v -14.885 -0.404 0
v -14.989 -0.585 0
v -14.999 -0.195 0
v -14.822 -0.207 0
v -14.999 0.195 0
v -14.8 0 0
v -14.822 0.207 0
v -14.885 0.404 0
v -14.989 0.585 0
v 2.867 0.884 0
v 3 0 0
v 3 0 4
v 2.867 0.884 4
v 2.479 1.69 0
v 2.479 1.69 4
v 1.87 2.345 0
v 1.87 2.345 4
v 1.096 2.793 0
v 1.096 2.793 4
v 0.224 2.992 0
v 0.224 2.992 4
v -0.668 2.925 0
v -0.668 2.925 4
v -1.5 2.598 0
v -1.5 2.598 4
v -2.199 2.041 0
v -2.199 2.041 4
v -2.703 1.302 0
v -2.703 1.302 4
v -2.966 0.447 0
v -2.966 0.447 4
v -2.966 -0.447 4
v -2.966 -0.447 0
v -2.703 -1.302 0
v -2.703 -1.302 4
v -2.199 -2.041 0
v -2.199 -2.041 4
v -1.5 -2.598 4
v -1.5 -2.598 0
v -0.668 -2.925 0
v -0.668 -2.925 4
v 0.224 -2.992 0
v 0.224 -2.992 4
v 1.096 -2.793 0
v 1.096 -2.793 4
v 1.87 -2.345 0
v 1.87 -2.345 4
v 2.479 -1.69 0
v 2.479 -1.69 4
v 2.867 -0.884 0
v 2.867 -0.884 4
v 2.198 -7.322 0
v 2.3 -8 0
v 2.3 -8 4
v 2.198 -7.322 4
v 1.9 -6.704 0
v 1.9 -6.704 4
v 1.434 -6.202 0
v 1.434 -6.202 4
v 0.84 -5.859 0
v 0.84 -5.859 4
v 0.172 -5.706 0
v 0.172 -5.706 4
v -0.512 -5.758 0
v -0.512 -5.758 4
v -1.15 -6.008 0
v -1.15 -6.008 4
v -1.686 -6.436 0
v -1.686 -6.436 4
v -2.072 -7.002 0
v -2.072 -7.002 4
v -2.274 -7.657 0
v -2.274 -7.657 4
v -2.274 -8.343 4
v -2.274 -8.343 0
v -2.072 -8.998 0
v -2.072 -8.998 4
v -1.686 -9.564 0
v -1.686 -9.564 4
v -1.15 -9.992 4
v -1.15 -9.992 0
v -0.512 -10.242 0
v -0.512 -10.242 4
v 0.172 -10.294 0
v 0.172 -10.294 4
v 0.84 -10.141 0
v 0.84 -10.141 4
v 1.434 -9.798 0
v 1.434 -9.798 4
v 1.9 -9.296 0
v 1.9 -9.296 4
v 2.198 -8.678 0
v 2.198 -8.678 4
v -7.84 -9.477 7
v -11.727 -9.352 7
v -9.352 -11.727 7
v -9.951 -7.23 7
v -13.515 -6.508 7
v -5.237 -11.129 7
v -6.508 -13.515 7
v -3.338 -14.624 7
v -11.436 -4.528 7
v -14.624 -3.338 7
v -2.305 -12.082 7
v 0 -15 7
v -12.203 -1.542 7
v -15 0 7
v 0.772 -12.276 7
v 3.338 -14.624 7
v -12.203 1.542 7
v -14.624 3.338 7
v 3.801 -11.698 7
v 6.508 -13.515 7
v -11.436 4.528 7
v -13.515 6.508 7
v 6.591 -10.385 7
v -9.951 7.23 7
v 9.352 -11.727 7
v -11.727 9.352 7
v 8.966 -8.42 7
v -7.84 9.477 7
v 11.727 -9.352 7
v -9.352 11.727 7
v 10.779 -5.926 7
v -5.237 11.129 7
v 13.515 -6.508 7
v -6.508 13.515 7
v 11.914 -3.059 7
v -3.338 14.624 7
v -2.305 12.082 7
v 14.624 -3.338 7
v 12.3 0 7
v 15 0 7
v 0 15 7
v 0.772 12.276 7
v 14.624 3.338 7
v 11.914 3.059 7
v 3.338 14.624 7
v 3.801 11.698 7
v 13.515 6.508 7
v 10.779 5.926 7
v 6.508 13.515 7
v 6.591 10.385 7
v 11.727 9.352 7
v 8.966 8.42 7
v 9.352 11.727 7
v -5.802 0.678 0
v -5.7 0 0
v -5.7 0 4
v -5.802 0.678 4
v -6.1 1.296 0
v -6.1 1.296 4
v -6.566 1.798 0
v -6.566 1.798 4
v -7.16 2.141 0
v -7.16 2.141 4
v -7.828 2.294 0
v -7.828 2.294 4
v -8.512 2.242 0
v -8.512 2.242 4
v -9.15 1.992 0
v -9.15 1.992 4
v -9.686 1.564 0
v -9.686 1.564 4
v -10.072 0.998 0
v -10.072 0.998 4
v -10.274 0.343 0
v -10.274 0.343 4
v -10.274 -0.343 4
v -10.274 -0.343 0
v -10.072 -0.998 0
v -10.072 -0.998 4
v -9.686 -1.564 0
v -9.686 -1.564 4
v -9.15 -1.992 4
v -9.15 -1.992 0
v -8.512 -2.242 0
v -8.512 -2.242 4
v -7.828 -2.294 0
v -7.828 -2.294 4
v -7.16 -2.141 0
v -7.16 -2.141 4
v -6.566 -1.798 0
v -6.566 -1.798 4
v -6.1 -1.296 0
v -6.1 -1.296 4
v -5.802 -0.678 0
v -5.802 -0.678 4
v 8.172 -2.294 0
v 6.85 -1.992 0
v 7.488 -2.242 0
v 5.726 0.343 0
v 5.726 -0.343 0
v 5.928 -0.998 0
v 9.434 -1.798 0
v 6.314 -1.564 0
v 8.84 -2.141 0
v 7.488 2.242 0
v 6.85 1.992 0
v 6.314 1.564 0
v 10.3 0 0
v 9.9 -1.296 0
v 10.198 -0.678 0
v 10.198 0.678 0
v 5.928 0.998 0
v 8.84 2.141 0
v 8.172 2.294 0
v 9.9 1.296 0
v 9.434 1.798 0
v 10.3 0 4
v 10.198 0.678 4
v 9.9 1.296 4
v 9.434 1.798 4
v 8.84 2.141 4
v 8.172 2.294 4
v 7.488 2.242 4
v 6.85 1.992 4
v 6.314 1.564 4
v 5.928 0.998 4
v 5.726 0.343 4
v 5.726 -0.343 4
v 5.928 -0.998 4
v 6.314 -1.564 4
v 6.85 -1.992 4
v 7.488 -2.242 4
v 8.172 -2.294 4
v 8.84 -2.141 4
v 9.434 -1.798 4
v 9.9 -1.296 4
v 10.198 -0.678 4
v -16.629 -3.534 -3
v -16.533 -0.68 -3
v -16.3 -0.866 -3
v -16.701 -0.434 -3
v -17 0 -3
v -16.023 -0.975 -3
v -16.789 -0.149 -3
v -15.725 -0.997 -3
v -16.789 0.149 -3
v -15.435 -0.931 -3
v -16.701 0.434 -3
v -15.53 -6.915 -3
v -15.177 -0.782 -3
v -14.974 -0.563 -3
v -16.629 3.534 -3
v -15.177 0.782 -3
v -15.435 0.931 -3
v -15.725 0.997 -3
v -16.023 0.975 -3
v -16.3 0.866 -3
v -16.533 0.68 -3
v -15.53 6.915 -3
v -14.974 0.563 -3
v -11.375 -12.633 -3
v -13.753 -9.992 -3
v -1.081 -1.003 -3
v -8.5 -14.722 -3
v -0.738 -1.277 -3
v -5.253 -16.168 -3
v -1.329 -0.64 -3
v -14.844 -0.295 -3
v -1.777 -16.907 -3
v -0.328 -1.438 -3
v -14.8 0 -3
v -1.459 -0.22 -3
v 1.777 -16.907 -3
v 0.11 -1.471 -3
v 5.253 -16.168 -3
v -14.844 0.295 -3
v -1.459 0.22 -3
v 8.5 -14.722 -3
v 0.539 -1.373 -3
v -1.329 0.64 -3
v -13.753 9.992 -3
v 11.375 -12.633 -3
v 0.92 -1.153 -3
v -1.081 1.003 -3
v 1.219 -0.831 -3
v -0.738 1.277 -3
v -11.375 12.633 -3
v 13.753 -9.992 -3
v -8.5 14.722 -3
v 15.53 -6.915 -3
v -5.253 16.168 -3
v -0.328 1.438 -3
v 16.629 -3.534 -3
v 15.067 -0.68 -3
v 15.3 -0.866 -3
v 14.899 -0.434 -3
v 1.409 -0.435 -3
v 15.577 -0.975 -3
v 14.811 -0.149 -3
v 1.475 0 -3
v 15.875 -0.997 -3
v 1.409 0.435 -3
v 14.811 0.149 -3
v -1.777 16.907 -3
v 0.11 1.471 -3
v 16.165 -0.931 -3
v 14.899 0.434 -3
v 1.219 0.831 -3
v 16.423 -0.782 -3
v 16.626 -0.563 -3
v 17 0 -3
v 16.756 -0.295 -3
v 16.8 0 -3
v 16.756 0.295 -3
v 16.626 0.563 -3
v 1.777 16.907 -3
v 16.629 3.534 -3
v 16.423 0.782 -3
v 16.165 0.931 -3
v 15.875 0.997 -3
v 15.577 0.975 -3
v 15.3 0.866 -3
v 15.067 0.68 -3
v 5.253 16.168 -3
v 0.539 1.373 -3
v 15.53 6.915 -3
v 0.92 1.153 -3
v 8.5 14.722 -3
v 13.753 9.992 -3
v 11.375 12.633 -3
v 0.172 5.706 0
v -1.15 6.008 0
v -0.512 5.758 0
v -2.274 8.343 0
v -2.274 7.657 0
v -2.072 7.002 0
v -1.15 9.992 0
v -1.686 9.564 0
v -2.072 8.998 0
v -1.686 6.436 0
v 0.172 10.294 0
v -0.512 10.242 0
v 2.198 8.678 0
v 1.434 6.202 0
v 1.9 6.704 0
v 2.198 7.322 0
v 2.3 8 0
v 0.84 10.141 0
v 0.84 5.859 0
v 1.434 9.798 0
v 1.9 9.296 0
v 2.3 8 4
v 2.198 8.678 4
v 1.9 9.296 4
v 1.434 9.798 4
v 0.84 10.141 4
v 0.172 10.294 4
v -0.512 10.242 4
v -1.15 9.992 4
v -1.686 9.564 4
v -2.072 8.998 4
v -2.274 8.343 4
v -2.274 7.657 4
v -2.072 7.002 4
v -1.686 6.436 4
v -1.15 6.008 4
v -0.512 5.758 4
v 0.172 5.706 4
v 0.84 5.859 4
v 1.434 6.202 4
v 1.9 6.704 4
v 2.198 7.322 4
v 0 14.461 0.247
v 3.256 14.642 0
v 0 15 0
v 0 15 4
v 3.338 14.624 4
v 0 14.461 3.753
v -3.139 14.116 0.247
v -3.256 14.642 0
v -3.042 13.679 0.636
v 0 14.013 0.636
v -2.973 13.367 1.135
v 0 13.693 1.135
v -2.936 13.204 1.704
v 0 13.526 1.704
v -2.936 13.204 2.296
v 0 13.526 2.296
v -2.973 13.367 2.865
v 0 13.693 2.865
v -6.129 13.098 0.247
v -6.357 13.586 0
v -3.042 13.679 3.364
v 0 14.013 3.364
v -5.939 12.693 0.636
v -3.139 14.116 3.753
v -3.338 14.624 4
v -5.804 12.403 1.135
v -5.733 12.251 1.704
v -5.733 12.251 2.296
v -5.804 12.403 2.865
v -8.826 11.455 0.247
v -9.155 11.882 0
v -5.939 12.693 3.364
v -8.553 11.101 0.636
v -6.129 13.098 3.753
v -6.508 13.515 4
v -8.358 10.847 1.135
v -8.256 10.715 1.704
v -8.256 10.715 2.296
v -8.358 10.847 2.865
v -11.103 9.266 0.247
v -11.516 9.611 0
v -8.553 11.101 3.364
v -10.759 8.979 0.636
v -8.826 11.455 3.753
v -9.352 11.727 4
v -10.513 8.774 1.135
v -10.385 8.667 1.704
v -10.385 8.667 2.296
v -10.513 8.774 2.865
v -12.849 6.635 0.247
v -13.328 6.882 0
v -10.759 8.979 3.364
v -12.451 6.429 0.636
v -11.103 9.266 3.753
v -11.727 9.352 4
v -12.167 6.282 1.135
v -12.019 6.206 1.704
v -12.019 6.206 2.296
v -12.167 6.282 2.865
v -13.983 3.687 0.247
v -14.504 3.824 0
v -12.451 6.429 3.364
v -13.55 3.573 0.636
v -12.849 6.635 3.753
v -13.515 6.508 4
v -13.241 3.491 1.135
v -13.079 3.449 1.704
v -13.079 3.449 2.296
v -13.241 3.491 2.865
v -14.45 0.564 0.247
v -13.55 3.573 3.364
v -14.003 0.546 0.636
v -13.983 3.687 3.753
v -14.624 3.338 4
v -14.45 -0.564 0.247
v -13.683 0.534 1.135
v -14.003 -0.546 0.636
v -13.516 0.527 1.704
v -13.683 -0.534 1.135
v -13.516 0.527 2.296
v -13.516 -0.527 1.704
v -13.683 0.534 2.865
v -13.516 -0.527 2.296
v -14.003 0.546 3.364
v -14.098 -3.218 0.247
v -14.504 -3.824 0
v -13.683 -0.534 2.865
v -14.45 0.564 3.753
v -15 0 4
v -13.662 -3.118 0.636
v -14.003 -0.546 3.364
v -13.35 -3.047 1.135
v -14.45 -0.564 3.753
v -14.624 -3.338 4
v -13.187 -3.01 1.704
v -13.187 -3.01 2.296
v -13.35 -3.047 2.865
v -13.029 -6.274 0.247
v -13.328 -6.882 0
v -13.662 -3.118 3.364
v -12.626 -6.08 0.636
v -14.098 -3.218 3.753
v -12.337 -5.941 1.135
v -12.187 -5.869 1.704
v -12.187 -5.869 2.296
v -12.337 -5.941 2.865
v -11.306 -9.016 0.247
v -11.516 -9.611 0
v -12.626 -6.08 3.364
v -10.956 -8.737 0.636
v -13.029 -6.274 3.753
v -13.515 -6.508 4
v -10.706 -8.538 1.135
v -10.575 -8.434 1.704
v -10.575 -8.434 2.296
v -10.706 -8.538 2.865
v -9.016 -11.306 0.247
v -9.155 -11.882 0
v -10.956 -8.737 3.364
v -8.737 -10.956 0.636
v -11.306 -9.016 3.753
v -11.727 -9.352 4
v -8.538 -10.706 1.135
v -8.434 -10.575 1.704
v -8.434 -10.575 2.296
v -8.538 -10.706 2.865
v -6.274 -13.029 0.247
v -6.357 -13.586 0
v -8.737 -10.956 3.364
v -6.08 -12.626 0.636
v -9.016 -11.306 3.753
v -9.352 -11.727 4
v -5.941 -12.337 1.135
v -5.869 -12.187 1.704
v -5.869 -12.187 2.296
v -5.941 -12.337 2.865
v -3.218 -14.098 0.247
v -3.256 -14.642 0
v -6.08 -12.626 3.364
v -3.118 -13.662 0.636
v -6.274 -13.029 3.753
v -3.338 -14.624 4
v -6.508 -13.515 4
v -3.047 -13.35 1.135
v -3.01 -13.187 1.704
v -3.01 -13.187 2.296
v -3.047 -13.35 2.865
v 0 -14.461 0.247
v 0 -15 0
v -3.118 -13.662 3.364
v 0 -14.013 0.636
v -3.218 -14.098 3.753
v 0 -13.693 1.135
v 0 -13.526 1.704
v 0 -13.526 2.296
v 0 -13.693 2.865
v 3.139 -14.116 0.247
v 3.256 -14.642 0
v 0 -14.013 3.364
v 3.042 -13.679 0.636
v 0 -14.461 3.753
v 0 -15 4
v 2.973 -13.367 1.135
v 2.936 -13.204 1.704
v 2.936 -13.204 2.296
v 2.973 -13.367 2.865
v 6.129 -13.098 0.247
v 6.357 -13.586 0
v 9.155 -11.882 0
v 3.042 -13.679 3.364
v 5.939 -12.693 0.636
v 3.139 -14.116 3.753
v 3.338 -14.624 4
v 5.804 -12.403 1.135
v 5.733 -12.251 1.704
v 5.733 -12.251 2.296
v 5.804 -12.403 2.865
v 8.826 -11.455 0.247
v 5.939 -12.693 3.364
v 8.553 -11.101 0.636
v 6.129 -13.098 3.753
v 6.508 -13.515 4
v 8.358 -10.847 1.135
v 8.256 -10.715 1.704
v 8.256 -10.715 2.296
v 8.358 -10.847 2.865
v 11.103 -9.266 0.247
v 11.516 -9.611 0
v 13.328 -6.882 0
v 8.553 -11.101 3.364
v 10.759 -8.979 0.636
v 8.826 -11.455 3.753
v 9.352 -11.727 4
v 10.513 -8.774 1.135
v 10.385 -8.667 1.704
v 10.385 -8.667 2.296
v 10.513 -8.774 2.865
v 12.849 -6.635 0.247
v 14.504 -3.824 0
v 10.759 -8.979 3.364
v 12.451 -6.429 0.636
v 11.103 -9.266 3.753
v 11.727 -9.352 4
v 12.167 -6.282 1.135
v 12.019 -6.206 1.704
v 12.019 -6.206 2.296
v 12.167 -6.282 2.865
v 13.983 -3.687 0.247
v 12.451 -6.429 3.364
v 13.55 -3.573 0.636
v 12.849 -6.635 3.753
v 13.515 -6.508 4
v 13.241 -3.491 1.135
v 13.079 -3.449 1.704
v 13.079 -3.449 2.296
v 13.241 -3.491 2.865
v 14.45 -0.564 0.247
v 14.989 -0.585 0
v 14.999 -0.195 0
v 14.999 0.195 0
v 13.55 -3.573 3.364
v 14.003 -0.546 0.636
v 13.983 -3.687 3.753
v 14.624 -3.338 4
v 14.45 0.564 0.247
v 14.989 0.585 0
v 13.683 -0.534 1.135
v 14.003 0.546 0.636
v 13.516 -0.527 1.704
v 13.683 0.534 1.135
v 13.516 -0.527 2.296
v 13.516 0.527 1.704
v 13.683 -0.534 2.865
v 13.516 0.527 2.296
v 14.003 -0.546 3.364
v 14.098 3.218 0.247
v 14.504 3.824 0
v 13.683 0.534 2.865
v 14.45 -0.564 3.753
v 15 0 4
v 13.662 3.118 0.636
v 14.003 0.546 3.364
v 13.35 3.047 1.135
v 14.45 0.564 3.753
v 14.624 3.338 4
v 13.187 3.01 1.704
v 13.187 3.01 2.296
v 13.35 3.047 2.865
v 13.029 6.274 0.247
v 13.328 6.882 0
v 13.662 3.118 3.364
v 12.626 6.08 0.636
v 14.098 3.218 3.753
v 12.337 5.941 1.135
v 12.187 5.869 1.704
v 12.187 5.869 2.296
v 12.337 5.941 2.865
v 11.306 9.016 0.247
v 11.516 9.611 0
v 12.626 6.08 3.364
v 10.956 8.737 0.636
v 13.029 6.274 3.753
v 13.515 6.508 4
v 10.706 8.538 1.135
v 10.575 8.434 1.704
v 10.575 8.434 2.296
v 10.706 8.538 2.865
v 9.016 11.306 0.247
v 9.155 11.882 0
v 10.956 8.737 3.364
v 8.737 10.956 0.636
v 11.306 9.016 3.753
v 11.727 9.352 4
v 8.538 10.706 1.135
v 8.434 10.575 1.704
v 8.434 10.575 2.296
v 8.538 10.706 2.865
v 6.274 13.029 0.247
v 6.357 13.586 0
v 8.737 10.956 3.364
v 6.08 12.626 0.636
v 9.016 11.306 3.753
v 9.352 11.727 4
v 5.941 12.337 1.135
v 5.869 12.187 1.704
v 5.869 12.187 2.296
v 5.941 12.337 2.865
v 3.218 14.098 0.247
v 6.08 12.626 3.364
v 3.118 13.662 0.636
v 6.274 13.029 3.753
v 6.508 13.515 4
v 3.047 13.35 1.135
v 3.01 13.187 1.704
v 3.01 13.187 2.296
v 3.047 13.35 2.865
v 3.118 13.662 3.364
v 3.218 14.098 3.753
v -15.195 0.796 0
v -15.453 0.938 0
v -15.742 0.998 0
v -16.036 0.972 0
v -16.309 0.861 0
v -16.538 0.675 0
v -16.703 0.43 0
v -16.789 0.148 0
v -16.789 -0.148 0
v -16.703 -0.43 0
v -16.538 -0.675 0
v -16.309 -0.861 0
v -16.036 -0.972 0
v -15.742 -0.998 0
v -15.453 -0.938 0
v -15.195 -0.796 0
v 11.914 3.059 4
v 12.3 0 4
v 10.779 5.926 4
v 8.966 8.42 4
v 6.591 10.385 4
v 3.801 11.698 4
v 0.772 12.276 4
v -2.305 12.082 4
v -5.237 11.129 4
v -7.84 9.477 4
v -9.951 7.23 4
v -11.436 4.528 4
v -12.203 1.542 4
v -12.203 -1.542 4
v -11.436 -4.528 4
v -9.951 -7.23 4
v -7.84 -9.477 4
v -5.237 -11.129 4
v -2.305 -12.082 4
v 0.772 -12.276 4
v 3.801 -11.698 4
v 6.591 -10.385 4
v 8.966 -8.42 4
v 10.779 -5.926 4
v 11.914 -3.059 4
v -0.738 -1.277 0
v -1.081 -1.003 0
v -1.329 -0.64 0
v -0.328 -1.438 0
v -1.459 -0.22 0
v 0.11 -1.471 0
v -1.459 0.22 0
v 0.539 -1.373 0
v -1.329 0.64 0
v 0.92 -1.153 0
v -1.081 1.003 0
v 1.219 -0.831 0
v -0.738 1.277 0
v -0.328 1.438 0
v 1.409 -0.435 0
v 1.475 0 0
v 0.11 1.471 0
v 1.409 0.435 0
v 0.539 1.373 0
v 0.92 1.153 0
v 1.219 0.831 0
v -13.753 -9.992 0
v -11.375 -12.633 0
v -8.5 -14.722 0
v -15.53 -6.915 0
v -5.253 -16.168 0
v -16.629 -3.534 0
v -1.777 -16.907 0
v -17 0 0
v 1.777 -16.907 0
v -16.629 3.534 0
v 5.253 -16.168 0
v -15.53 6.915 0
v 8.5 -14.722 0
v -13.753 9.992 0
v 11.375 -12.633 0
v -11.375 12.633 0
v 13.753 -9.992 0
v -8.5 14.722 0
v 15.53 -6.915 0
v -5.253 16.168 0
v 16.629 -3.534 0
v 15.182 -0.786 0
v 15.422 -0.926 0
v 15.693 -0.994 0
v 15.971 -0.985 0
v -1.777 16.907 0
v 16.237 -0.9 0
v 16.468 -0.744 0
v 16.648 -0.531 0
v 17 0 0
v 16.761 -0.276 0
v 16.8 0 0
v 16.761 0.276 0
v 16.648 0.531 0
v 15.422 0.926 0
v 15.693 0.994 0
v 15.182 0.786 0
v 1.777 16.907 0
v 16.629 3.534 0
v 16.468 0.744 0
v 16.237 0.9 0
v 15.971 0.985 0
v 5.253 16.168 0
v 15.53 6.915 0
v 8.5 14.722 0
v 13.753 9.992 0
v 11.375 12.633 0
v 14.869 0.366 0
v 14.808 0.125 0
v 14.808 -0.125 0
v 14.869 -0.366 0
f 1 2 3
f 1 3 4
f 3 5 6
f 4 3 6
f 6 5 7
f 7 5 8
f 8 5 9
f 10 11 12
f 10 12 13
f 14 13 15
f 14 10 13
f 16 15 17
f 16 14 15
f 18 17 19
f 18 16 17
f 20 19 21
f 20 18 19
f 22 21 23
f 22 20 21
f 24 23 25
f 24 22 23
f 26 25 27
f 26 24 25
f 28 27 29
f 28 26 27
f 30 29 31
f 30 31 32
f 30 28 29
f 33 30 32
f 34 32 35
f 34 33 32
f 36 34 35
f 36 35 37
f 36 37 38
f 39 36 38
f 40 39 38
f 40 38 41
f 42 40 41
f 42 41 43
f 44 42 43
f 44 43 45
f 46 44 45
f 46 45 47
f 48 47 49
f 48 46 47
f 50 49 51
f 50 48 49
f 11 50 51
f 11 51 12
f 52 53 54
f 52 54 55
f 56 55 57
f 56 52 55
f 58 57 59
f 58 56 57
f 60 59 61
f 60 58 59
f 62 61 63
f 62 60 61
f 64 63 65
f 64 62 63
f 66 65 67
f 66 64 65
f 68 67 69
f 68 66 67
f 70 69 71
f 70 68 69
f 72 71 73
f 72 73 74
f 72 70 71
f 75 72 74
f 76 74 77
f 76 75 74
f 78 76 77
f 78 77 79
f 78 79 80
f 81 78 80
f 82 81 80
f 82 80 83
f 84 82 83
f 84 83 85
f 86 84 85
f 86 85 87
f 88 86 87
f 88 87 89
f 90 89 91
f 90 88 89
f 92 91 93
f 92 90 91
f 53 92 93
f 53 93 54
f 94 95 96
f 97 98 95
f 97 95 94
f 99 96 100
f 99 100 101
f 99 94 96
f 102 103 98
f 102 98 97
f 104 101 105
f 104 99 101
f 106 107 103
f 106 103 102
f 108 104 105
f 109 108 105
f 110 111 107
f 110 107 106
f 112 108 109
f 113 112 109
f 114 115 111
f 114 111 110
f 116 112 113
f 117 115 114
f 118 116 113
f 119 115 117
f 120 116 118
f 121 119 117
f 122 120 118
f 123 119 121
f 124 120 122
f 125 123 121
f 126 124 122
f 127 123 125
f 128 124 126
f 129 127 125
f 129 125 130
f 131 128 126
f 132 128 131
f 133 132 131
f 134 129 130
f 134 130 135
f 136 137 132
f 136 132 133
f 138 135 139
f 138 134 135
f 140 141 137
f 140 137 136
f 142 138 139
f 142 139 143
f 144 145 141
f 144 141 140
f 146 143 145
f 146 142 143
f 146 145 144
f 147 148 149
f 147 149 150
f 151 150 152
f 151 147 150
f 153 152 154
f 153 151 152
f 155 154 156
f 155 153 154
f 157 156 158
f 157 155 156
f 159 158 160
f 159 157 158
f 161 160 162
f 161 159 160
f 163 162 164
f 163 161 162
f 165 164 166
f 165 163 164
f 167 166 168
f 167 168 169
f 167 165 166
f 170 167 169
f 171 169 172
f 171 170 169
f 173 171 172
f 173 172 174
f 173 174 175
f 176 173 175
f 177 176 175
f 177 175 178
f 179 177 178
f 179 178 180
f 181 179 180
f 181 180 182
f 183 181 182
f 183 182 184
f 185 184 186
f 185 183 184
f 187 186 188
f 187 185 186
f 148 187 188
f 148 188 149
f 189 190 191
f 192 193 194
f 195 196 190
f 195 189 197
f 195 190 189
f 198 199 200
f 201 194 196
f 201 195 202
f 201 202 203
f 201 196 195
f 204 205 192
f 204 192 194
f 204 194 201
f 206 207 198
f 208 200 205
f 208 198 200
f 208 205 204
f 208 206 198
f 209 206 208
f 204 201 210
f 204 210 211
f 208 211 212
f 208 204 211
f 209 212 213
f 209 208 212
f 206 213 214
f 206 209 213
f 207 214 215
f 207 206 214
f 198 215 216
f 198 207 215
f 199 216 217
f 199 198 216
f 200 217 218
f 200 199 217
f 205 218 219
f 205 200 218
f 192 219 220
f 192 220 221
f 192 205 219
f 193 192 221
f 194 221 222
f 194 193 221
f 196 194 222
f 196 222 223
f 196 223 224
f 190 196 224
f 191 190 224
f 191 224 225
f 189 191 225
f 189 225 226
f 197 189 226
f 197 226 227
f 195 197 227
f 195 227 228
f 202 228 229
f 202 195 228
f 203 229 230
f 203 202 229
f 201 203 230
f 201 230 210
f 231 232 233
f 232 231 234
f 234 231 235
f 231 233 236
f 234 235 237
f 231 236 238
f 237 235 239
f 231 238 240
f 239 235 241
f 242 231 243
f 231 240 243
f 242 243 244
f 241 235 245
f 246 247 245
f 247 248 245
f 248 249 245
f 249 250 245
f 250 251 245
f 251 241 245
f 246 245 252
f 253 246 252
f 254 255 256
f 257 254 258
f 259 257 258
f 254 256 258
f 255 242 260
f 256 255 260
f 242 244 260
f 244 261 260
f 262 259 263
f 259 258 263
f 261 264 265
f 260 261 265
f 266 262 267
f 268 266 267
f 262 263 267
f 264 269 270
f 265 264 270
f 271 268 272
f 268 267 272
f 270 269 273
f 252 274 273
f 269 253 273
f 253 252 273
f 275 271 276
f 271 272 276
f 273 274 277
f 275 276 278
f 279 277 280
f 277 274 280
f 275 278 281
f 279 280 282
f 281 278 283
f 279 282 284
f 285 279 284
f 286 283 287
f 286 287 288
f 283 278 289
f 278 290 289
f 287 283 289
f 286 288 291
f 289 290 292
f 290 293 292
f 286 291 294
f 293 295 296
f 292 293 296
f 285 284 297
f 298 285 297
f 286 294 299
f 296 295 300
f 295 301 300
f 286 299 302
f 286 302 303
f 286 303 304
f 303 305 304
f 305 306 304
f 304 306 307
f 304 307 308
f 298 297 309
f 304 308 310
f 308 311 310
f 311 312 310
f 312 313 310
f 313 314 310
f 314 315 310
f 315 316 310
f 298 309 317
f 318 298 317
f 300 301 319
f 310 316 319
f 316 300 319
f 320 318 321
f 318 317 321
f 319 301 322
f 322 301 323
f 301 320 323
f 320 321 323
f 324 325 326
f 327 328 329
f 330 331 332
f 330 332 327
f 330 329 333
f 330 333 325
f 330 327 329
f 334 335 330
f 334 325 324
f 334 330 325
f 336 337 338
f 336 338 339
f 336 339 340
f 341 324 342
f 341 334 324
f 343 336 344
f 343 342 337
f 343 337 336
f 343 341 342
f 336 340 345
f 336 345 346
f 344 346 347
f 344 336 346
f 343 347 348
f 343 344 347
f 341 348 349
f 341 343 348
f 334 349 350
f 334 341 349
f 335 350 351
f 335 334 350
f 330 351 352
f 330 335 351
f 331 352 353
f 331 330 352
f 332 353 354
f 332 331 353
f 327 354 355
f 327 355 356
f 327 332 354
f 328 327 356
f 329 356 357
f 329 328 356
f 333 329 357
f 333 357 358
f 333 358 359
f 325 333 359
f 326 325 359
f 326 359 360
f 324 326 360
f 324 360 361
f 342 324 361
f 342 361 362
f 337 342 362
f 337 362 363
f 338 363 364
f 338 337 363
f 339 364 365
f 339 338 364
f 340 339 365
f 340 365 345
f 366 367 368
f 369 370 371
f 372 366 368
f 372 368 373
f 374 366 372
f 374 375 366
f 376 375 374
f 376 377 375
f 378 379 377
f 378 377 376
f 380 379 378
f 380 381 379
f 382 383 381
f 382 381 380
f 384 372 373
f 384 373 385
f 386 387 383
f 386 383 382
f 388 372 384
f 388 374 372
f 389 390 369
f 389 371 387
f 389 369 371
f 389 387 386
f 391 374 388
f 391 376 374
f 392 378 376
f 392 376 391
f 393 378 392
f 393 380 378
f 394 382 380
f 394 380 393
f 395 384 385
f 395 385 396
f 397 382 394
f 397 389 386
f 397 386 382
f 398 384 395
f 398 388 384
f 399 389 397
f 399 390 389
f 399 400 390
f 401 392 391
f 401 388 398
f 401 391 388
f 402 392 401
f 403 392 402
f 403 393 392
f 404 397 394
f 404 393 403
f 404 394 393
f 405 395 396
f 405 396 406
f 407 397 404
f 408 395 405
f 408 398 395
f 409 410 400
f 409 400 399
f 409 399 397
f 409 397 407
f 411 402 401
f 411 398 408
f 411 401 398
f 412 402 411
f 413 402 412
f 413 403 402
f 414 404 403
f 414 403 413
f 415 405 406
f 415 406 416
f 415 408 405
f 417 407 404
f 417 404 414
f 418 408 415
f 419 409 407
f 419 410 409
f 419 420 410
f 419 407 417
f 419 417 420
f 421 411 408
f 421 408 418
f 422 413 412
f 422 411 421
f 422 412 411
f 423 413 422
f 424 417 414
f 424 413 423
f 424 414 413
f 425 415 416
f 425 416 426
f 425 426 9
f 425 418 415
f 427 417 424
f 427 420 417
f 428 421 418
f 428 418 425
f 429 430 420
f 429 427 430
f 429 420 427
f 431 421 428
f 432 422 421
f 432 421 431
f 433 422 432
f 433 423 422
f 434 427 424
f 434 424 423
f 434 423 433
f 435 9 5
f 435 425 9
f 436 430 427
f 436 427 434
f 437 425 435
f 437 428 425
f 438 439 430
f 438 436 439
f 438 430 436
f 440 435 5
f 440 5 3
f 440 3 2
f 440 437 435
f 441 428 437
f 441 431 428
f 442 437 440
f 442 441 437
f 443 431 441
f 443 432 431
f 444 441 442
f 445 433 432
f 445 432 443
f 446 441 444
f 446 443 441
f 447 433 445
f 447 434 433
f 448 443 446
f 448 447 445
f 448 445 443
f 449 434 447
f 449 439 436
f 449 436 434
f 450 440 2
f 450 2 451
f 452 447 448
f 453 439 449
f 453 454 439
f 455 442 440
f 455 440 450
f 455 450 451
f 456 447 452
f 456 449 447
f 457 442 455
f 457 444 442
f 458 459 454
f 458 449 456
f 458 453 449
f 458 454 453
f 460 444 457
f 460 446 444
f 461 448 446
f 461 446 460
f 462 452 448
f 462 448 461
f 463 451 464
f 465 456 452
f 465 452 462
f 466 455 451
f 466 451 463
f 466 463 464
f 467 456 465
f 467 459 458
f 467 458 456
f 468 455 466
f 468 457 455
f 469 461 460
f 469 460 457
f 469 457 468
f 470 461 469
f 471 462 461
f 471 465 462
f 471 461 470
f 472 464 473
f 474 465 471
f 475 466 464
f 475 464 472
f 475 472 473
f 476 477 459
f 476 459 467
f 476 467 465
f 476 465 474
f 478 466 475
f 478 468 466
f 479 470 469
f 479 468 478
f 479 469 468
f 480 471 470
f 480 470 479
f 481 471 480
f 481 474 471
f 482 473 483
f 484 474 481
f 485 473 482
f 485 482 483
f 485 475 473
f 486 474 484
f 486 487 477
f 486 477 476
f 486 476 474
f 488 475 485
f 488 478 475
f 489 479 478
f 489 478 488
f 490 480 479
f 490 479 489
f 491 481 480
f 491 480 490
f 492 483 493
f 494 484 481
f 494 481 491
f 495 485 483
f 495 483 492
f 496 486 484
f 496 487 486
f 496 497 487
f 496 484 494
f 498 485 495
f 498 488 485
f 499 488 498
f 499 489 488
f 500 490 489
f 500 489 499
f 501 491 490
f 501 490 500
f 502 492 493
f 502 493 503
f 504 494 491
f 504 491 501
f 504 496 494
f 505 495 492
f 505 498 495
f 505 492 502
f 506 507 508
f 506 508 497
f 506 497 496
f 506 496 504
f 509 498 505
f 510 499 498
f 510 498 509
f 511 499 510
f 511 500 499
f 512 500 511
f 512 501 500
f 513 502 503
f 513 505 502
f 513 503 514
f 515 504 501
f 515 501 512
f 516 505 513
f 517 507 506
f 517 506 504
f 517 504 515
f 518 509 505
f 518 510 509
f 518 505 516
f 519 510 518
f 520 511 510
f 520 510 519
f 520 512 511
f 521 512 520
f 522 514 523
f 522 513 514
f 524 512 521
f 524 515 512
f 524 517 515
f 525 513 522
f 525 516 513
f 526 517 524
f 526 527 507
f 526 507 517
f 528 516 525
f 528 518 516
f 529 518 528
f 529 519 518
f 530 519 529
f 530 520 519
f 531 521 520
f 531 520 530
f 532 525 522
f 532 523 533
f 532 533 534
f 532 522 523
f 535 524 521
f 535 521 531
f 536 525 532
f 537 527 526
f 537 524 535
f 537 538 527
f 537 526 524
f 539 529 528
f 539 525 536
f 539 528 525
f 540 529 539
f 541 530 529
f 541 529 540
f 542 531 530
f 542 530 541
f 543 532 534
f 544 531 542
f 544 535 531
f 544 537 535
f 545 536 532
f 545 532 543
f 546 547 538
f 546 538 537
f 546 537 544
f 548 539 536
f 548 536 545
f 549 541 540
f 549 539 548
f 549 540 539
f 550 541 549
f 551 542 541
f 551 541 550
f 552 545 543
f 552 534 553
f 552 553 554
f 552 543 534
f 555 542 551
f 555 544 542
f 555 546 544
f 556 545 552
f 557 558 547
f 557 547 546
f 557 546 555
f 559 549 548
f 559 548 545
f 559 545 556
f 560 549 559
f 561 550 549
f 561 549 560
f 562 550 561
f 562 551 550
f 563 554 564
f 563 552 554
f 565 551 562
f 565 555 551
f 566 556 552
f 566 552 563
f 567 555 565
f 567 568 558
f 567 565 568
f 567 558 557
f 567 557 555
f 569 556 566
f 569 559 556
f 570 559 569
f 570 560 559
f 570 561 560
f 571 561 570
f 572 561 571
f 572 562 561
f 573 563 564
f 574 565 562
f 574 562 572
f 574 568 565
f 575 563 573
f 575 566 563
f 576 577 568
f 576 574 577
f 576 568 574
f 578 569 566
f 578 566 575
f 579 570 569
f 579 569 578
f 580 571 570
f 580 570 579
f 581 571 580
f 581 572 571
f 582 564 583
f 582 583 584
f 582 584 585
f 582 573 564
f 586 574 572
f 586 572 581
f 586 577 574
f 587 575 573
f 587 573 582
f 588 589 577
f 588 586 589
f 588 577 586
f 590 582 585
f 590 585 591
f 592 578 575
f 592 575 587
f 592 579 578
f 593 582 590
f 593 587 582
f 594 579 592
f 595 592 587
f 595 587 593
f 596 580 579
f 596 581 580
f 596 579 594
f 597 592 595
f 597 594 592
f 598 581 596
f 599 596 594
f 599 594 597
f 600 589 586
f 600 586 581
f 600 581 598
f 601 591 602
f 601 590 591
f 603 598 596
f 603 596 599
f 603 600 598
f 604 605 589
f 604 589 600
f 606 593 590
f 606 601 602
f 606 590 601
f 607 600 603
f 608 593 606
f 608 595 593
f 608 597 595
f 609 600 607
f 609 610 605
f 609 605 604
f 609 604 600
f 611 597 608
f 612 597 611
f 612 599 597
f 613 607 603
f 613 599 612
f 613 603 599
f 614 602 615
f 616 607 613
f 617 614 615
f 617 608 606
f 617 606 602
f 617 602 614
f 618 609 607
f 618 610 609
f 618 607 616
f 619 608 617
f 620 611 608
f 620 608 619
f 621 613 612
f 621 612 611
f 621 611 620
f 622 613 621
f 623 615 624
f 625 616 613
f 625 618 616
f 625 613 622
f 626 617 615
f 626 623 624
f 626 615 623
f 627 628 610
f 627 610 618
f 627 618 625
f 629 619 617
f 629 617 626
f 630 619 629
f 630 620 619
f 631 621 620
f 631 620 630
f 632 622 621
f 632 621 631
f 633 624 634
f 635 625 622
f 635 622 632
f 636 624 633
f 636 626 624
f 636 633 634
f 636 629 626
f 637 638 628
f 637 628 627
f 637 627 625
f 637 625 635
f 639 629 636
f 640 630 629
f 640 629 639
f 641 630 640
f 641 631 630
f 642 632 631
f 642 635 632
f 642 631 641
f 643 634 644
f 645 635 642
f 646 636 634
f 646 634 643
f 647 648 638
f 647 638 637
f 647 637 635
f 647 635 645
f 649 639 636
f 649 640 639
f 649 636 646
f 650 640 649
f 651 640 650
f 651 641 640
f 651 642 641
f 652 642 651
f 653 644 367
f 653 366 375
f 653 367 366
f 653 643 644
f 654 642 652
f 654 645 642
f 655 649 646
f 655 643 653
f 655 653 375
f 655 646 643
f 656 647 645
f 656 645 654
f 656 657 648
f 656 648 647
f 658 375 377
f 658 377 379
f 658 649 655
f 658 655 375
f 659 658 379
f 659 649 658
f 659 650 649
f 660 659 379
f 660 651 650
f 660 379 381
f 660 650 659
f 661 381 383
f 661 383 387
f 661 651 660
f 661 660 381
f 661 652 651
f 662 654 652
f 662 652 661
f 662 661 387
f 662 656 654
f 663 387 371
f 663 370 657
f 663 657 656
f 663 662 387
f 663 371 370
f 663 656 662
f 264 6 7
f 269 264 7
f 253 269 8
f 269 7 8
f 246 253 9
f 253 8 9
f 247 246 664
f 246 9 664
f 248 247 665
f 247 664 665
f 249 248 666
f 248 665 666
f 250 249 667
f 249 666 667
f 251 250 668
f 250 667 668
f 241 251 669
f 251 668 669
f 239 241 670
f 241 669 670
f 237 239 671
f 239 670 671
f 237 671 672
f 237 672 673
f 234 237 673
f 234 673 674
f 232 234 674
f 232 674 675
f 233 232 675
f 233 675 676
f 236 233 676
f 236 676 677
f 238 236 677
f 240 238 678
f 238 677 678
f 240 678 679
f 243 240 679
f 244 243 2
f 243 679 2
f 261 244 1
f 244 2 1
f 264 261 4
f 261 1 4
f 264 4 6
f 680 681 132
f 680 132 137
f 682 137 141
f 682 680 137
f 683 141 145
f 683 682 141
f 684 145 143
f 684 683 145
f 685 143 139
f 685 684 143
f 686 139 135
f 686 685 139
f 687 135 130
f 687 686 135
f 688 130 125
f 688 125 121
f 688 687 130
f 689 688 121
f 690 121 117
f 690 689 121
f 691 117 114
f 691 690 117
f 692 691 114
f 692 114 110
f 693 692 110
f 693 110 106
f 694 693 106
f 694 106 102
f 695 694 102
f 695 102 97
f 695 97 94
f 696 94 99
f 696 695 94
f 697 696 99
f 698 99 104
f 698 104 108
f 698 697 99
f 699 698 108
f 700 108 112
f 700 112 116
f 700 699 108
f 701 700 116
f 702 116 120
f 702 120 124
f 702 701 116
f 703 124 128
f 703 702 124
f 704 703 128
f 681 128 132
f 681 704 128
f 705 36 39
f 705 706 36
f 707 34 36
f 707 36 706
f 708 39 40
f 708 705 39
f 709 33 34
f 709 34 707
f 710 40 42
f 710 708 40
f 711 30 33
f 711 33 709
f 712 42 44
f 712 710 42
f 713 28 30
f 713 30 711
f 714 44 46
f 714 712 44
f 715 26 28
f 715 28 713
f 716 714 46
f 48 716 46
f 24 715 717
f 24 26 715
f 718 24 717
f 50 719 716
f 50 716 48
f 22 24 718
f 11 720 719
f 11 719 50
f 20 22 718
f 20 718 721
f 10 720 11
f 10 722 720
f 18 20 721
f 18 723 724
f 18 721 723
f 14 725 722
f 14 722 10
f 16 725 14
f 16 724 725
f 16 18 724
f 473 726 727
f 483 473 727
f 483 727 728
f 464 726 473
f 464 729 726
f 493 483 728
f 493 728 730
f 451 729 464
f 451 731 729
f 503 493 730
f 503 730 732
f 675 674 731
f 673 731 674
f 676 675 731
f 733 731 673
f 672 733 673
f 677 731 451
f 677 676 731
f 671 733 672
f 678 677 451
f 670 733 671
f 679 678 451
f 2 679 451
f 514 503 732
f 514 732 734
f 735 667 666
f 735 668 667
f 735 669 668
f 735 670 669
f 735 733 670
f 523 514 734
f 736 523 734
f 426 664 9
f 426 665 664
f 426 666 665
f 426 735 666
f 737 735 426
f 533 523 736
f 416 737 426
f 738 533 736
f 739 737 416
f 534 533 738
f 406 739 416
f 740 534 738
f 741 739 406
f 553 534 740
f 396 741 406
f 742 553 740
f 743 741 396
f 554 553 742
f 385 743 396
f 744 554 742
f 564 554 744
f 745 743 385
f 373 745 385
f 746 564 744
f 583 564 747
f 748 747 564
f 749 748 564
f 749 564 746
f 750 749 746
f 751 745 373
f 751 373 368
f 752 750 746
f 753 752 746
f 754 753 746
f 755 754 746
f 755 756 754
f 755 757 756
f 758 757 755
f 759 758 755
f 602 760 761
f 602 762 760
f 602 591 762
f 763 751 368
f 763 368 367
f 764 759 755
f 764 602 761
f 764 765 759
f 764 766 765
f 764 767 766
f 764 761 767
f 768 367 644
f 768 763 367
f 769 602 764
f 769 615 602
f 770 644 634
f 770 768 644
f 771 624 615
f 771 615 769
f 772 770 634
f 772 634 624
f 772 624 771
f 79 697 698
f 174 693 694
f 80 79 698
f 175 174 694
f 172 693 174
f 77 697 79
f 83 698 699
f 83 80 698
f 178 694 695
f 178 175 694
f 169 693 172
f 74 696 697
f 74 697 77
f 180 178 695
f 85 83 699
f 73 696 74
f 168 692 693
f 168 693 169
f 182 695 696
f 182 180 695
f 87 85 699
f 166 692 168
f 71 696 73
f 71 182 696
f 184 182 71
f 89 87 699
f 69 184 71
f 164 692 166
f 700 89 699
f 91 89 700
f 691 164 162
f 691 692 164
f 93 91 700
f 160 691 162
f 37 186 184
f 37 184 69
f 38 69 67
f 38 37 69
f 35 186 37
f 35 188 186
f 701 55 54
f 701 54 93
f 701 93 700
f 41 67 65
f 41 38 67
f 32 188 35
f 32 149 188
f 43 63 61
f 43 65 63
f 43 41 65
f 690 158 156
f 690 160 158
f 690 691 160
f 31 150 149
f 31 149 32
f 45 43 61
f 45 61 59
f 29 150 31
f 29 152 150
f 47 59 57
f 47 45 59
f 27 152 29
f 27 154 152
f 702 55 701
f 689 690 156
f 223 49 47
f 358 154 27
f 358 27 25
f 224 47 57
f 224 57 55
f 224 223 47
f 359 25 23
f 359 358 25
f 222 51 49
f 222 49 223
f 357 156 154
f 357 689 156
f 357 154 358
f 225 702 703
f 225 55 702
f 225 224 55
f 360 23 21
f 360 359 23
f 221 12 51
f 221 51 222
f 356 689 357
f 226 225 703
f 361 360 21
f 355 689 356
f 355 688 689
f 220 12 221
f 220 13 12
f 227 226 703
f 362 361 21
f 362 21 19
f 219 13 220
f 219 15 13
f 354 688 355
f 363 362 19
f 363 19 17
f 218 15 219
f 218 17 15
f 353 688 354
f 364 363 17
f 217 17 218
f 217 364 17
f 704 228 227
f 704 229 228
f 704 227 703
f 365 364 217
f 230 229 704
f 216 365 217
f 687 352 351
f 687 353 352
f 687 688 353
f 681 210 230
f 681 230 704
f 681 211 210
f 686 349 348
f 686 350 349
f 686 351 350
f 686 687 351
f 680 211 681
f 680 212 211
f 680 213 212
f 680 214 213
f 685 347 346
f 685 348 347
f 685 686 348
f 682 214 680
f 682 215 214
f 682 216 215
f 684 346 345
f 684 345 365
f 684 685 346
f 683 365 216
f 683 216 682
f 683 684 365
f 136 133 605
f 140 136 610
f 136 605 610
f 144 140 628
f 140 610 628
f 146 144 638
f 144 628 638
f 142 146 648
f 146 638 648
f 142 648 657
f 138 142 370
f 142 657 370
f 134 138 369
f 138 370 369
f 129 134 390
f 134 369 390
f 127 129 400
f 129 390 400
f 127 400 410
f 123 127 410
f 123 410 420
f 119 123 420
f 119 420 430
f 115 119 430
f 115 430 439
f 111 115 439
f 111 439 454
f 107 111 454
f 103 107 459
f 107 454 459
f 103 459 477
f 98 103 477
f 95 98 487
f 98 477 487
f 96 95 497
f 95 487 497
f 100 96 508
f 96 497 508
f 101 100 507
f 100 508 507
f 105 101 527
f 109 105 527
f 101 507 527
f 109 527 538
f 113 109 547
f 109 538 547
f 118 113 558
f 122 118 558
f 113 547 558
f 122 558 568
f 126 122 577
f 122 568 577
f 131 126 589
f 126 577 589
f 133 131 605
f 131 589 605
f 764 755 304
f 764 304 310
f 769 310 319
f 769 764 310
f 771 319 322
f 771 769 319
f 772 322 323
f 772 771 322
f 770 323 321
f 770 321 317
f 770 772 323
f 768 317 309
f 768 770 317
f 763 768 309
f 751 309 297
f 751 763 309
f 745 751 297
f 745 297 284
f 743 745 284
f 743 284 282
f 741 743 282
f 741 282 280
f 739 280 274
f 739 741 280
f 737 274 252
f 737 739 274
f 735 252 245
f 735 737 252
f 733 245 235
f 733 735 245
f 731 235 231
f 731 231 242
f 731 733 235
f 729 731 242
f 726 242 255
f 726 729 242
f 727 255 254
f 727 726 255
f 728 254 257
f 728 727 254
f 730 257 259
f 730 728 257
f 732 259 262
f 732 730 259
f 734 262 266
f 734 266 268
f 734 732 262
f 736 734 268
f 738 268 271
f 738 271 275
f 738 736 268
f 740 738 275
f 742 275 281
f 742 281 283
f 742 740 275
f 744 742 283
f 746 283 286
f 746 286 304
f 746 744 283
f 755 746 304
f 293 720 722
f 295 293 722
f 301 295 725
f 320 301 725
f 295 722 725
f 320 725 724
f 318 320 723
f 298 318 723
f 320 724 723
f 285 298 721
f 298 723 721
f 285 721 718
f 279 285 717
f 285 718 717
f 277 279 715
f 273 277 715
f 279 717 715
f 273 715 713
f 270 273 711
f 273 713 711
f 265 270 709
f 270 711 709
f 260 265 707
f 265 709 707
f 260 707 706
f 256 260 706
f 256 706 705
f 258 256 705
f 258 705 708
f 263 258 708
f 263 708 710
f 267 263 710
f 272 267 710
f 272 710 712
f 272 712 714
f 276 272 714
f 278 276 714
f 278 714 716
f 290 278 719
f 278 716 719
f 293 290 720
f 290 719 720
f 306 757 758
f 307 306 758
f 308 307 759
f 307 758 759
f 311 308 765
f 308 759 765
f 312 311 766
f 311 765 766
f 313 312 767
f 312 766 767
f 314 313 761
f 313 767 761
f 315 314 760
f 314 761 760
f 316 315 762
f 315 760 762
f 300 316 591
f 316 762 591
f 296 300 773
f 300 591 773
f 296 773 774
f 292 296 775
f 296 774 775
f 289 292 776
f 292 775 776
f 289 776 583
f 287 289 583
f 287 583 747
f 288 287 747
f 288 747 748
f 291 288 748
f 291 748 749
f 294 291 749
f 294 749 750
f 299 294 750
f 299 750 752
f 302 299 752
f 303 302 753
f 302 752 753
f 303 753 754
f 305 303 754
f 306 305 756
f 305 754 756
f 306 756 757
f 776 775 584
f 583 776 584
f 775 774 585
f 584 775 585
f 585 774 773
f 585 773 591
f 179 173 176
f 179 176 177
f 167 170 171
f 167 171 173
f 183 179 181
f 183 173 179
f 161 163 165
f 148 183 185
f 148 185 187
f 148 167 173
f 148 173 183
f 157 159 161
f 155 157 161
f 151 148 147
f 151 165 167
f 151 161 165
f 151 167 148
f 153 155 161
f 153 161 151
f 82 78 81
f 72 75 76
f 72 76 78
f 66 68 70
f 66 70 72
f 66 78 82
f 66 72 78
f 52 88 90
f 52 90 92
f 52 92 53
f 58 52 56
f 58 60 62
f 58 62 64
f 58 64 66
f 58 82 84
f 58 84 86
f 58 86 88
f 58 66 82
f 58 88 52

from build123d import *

# Parameters (mm, degrees)
SKETCH2_R           = 15
SKETCH2_R_2         = 3
SKETCH2_R_3         = 2.3
BOSS_EXTRUDE1_DEPTH = 4
SKETCH3_R           = 17
SKETCH3_R_2         = 1.475
SKETCH3_R_3         = 1
BOSS_EXTRUDE2_DEPTH = 3
SKETCH8_R           = 15
SKETCH8_R_2         = 12.3
BOSS_EXTRUDE5_DEPTH = 3


with BuildPart() as part:
    # Sketch2 → Boss-Extrude1 (new body)
    with BuildSketch(Plane.XY):
        Circle(SKETCH2_R)
        Circle(SKETCH2_R_2, mode=Mode.SUBTRACT)
        with Locations((-8, 0)):
            Circle(SKETCH2_R_3, mode=Mode.SUBTRACT)
        with Locations((0, 8)):
            Circle(SKETCH2_R_3, mode=Mode.SUBTRACT)
        with Locations((8, 0)):
            Circle(SKETCH2_R_3, mode=Mode.SUBTRACT)
        with Locations((0, -8)):
            Circle(SKETCH2_R_3, mode=Mode.SUBTRACT)
    extrude(amount=BOSS_EXTRUDE1_DEPTH)

    # Sketch3 → Boss-Extrude2 (add)
    with BuildSketch(Plane.XY):
        Circle(SKETCH3_R)
        Circle(SKETCH3_R_2, mode=Mode.SUBTRACT)
        with Locations((-15.8, 0)):
            Circle(SKETCH3_R_3, mode=Mode.SUBTRACT)
        with Locations((15.8, 0)):
            Circle(SKETCH3_R_3, mode=Mode.SUBTRACT)
    extrude(amount=-BOSS_EXTRUDE2_DEPTH)

    # Sketch7 → Cut-Revolve1 (revolve, cut)
    with BuildSketch(Plane(origin=(0, 0, 0), x_dir=(0, 0, -1), z_dir=(1, 0, 0))):
        with BuildLine():
            Line((-4, 15), (0, 15))
            ThreePointArc((0, 15), (-2, 13.505217823), (-4, 15))
        make_face()
    revolve(axis=Axis((0, 0, 0), (0, 0, 1)), mode=Mode.SUBTRACT)

    # Sketch8 → Boss-Extrude5 (add)
    with BuildSketch(Plane.XY.offset(4)):
        Circle(SKETCH8_R)
        Circle(SKETCH8_R_2, mode=Mode.SUBTRACT)
    extrude(amount=BOSS_EXTRUDE5_DEPTH)


solid = part.part
